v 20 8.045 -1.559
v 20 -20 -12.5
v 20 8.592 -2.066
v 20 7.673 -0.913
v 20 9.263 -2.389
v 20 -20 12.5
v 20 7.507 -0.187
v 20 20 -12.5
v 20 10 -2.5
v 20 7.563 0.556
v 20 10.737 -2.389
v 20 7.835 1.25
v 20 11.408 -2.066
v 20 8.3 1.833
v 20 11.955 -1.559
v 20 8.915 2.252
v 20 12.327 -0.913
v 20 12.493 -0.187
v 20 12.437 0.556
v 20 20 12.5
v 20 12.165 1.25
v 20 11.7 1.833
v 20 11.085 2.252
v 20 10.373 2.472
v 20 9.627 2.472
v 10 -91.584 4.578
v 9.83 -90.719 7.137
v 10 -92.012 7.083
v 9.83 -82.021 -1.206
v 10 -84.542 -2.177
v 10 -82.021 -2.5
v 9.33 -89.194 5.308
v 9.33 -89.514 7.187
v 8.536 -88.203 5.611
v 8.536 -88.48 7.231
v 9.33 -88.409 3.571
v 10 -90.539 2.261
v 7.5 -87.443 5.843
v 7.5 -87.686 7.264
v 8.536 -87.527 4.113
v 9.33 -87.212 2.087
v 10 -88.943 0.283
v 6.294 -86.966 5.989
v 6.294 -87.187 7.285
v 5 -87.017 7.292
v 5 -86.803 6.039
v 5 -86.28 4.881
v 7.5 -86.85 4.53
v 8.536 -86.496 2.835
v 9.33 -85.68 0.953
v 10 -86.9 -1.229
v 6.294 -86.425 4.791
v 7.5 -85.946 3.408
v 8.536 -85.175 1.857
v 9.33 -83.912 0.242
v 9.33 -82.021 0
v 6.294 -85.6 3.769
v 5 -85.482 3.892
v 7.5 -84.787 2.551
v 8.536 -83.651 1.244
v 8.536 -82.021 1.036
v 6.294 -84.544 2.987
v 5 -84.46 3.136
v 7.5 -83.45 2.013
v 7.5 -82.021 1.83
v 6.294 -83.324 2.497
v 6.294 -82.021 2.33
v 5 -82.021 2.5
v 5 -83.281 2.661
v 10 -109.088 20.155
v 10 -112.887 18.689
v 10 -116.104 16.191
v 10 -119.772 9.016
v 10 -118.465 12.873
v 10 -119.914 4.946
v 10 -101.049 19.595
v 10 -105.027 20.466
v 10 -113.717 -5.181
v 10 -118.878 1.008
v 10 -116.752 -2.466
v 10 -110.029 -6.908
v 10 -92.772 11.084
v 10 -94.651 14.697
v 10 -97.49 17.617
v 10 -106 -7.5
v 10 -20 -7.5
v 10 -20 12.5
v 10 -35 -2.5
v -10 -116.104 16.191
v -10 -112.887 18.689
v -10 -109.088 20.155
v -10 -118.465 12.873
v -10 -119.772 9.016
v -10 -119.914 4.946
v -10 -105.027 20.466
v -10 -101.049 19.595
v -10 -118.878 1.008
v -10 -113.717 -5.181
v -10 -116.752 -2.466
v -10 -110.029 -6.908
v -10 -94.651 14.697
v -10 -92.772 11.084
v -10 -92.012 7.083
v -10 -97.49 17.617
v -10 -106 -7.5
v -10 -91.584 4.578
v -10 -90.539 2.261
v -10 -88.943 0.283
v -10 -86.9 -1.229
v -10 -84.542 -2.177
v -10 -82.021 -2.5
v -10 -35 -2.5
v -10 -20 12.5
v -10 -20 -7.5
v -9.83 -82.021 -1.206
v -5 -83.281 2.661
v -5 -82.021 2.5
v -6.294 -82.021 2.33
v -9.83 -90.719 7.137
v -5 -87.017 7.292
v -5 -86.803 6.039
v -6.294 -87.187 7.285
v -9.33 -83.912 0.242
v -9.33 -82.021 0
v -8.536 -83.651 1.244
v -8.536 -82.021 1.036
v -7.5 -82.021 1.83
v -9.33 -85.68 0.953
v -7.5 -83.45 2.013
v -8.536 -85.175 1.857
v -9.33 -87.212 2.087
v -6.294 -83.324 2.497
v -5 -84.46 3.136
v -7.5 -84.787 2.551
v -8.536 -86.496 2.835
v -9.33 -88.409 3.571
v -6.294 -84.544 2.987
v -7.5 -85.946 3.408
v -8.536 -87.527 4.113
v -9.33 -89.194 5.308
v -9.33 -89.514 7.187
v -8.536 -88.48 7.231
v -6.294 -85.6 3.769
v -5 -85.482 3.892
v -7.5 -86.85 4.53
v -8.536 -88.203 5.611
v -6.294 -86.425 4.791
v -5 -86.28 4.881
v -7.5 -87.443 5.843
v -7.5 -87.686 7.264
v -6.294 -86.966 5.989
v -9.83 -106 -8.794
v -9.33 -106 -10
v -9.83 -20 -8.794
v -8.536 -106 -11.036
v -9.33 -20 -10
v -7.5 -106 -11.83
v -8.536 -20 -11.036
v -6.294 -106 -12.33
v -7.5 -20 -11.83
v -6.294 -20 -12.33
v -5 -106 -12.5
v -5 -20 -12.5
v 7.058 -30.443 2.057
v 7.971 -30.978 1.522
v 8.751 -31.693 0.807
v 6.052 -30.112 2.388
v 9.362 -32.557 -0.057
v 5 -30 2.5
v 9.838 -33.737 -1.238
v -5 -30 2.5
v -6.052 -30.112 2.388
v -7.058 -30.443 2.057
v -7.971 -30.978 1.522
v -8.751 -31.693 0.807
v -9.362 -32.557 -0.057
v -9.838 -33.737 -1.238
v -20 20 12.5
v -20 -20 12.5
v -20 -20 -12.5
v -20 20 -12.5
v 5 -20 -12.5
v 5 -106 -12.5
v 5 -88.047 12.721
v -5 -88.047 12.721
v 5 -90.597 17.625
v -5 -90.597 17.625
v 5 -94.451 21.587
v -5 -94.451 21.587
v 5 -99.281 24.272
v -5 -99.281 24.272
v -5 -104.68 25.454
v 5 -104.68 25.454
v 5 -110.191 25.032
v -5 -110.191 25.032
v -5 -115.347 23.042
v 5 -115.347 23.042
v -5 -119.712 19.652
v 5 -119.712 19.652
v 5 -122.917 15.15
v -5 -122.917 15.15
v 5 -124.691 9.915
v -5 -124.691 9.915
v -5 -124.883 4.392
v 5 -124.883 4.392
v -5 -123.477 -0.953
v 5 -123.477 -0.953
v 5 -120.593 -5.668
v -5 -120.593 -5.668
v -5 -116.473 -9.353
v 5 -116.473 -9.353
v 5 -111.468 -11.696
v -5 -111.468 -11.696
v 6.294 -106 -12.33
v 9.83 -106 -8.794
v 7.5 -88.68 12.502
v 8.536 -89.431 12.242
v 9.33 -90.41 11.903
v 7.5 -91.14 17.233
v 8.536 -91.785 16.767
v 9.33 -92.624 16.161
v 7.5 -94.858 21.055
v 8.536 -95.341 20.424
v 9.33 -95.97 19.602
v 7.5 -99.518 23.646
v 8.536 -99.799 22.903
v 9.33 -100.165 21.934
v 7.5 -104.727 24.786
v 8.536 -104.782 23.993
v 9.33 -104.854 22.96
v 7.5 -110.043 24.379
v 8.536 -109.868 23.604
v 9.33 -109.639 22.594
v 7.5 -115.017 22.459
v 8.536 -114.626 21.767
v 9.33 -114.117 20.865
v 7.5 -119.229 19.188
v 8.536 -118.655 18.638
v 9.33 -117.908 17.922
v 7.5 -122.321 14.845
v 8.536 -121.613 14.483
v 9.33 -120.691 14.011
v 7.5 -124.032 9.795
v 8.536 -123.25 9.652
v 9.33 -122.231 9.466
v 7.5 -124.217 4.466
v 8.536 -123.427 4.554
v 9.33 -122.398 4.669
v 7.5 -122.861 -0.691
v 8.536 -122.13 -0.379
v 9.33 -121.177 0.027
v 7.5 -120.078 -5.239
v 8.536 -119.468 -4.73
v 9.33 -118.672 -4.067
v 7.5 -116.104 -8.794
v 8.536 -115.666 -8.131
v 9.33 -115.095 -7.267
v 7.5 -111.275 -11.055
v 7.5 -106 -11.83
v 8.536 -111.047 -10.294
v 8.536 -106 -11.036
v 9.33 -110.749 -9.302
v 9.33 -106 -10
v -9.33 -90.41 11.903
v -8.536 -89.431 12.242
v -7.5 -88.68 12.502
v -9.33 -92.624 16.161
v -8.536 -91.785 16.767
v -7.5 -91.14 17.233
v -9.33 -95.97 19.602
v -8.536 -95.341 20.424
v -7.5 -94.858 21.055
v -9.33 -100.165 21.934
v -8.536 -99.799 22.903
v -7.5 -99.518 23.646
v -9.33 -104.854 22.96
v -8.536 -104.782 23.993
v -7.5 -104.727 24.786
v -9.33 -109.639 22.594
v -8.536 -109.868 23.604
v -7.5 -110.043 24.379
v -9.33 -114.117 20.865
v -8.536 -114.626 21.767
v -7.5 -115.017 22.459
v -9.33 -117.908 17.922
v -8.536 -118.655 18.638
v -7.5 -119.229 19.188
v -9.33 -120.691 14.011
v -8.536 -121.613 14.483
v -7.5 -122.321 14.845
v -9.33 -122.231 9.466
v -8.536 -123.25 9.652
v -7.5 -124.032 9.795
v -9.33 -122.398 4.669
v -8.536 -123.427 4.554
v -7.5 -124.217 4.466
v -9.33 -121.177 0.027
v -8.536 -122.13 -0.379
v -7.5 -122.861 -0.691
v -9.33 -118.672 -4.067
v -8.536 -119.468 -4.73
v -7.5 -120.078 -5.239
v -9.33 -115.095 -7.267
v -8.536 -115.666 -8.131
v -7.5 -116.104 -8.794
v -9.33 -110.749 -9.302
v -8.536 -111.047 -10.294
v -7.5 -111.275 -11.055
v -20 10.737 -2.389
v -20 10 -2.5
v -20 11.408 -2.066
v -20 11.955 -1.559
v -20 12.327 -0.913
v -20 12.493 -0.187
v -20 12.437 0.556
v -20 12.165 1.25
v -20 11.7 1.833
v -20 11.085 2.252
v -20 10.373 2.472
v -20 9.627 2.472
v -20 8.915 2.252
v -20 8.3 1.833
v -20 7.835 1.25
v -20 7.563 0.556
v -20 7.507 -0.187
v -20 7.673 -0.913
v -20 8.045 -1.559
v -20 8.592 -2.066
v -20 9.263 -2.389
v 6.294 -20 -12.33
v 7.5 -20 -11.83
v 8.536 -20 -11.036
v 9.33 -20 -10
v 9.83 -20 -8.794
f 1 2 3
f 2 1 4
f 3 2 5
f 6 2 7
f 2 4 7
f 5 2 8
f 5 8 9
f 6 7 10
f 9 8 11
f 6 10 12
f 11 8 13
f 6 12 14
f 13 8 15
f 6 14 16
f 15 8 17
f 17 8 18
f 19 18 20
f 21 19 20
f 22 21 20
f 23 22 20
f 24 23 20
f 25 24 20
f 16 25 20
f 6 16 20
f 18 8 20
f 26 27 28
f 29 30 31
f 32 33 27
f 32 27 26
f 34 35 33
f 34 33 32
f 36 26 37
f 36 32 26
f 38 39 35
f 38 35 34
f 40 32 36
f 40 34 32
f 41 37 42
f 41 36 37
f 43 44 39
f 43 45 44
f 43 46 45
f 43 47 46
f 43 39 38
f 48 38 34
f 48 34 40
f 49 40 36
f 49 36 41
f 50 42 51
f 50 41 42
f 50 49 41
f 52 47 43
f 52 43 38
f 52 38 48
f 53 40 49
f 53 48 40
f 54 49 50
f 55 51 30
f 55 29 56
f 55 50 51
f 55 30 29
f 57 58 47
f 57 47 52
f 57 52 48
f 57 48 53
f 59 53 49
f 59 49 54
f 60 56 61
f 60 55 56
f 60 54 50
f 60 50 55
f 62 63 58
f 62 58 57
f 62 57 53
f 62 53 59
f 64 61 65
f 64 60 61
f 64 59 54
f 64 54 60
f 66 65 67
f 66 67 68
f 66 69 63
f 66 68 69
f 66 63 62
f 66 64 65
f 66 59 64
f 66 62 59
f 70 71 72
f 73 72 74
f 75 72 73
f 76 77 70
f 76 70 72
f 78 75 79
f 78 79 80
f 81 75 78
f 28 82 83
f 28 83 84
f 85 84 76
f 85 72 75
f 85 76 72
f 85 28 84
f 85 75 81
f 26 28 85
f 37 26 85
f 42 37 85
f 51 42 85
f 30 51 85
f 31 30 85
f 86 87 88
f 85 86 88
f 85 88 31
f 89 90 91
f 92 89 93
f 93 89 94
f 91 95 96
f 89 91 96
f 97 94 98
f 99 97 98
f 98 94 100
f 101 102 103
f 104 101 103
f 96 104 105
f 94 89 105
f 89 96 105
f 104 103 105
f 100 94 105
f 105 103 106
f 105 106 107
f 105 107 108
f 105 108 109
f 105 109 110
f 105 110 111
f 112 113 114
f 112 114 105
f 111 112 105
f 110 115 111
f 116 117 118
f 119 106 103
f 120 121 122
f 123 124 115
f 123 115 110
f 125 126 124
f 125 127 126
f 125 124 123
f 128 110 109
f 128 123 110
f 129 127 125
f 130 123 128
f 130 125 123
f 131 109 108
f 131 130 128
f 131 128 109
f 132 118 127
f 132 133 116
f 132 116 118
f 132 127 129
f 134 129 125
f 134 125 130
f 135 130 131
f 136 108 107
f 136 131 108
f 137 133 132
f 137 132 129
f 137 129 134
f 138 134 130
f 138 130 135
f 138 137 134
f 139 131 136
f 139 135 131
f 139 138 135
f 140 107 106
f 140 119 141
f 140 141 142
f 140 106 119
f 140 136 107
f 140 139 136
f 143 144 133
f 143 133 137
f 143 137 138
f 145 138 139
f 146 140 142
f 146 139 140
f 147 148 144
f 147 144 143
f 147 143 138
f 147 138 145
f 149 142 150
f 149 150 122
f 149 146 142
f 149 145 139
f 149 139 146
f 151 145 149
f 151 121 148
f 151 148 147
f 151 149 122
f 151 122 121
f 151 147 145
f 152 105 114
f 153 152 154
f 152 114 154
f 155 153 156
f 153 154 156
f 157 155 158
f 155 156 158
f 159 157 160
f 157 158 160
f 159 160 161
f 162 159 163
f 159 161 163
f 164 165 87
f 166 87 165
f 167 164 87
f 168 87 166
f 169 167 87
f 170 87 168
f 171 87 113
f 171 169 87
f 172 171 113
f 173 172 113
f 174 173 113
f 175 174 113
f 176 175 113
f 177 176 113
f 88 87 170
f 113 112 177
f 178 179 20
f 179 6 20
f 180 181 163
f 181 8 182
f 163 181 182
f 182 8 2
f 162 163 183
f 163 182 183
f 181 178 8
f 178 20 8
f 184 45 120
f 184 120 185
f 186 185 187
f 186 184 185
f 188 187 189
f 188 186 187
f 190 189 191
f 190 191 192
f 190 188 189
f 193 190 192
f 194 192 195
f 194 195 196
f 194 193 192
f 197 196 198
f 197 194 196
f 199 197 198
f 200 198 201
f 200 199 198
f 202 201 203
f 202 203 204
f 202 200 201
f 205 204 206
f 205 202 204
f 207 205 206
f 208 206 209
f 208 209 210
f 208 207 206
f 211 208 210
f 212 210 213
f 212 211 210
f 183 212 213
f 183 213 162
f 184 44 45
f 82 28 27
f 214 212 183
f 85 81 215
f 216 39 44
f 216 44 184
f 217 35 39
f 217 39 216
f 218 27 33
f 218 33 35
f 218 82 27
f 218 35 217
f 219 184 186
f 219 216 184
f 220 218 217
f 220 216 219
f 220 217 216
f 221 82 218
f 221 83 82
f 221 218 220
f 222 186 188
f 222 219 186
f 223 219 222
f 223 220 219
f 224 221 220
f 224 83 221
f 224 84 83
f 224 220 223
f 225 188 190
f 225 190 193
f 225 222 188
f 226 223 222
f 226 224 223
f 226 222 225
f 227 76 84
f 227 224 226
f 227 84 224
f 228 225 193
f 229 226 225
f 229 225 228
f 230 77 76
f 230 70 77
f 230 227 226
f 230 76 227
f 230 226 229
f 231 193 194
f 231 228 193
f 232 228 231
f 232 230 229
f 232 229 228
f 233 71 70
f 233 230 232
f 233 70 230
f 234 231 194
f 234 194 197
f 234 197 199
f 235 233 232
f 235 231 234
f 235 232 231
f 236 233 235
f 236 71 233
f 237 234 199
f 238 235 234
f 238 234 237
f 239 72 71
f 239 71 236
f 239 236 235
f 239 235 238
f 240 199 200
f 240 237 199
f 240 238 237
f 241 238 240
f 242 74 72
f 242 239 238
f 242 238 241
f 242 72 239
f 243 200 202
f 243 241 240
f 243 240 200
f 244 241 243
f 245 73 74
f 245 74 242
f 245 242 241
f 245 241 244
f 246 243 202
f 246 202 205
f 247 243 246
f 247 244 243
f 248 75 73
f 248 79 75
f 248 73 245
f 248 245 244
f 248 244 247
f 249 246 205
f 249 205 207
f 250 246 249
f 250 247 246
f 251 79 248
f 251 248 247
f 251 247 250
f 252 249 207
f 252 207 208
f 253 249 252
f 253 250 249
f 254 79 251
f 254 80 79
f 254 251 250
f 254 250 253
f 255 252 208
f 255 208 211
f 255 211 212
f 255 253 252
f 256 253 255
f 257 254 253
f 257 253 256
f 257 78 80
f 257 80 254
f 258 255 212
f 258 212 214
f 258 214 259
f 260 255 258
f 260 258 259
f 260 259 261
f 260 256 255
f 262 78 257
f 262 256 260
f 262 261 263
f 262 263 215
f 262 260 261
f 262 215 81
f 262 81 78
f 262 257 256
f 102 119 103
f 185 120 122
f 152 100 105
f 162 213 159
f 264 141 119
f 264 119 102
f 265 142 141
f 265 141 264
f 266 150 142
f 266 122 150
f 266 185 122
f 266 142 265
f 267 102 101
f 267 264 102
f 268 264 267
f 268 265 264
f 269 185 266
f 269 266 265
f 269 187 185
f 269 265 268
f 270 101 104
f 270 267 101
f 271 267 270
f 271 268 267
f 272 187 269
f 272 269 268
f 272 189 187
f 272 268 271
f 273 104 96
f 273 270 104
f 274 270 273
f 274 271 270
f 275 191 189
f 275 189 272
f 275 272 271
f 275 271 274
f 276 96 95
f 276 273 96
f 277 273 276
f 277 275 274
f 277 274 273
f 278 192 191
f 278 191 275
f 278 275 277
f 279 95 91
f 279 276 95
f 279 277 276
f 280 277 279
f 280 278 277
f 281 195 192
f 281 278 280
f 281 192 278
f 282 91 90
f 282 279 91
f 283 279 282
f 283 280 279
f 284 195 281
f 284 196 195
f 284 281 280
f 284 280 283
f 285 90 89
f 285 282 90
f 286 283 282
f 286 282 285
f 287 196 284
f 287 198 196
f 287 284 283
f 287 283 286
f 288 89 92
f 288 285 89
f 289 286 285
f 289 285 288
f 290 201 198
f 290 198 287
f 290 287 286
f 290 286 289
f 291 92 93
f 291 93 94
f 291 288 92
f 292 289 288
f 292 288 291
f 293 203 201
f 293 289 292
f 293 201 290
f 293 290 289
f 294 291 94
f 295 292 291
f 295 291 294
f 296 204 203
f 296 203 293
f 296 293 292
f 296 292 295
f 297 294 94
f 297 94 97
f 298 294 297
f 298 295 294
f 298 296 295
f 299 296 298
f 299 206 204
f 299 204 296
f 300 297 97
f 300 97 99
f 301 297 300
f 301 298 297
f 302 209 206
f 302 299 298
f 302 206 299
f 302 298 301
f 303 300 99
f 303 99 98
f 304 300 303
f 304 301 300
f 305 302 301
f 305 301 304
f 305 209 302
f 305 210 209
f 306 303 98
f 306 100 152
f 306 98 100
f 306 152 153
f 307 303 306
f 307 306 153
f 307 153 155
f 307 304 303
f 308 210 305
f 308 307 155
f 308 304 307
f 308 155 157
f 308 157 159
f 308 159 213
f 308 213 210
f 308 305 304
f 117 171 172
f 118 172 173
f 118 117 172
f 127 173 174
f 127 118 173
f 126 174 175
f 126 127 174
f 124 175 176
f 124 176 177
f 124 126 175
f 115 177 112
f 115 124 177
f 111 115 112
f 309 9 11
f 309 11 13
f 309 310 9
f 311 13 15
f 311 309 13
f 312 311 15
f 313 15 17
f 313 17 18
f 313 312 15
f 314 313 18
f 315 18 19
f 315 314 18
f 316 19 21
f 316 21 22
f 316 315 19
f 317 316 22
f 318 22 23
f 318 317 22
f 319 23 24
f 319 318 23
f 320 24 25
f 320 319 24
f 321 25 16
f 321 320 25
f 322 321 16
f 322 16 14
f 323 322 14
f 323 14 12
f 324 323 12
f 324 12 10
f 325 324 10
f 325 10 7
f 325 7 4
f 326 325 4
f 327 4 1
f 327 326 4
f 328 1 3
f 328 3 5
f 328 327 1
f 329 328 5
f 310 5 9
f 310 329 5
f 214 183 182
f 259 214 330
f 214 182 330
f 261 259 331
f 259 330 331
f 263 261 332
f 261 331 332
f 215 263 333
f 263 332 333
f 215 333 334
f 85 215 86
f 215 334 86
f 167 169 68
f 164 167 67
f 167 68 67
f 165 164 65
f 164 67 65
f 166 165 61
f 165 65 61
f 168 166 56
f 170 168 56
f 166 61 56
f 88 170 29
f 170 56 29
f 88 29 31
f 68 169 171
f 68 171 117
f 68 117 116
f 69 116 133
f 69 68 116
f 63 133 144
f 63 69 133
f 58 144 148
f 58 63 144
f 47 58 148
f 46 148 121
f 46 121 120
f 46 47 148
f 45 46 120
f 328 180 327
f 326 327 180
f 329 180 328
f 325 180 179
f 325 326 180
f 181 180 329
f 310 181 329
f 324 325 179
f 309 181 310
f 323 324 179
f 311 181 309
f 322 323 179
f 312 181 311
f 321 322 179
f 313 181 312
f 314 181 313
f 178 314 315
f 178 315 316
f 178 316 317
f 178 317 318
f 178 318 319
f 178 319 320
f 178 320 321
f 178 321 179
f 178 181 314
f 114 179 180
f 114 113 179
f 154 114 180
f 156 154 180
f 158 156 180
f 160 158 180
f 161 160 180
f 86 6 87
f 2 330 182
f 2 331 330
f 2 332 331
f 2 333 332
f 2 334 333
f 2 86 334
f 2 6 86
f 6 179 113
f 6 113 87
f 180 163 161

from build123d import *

# Parameters (mm, degrees)
BOSS_EXTRUDE2_DEPTH = 10
SKETCH1_5_R         = 2.5
BOSS_EXTRUDE3_DEPTH = 20
CHAMFER1_SIZE       = 10
FILLET1_R           = 5


with BuildPart() as part:
    # Sketch1 → Boss-Extrude2 (new, symmetric)
    with BuildSketch(Plane(origin=(0, 0, 0), x_dir=(0, 0, -1), z_dir=(1, 0, 0))):
        with BuildLine():
            Line((-2.5, -20), (-2.5, -87.425824379))
            ThreePointArc((-2.5, -87.425824379), (-21.281745499, -117.937336386), (12.5, -106))
            Line((12.5, -106), (12.5, -20))
            Line((12.5, -20), (-2.5, -20))
        make_face()
    extrude(amount=BOSS_EXTRUDE2_DEPTH, both=True)

    # Sketch1<5> → Boss-Extrude3 (add, symmetric)
    with BuildSketch(Plane(origin=(0, 0, 0), x_dir=(0, 0, -1), z_dir=(1, 0, 0))):
        Polygon((12.5, -20), (-2.5, -20), (-12.5, -20), (-12.5, 20), (12.5, 20), align=None)
        with Locations((0, 10)):
            Circle(SKETCH1_5_R, mode=Mode.SUBTRACT)
    extrude(amount=BOSS_EXTRUDE3_DEPTH, both=True)

    # Chamfer1
    chamfer1_edges = [part.edges().sort_by_distance(p)[0] for p in [
        (0, -20, 2.5),
    ]]
    chamfer(chamfer1_edges, length=CHAMFER1_SIZE - 0.0001)  # a hair under: the kernel refuses the full size

    # Fillet1
    fillet1_edges = [part.edges().sort_by_distance(p)[0] for p in [
        (10, -117.937336386, 21.281745499),
        (10, -63, -12.5),
        (-10, -58.712862189, 2.5),
        (10, -58.712862189, 2.5),
        (-10, -63, -12.5),
        (-10, -117.937336386, 21.281745499),
        (0, -87.425824379, 2.5),
    ]]
    fillet(fillet1_edges, radius=FILLET1_R)


solid = part.part
